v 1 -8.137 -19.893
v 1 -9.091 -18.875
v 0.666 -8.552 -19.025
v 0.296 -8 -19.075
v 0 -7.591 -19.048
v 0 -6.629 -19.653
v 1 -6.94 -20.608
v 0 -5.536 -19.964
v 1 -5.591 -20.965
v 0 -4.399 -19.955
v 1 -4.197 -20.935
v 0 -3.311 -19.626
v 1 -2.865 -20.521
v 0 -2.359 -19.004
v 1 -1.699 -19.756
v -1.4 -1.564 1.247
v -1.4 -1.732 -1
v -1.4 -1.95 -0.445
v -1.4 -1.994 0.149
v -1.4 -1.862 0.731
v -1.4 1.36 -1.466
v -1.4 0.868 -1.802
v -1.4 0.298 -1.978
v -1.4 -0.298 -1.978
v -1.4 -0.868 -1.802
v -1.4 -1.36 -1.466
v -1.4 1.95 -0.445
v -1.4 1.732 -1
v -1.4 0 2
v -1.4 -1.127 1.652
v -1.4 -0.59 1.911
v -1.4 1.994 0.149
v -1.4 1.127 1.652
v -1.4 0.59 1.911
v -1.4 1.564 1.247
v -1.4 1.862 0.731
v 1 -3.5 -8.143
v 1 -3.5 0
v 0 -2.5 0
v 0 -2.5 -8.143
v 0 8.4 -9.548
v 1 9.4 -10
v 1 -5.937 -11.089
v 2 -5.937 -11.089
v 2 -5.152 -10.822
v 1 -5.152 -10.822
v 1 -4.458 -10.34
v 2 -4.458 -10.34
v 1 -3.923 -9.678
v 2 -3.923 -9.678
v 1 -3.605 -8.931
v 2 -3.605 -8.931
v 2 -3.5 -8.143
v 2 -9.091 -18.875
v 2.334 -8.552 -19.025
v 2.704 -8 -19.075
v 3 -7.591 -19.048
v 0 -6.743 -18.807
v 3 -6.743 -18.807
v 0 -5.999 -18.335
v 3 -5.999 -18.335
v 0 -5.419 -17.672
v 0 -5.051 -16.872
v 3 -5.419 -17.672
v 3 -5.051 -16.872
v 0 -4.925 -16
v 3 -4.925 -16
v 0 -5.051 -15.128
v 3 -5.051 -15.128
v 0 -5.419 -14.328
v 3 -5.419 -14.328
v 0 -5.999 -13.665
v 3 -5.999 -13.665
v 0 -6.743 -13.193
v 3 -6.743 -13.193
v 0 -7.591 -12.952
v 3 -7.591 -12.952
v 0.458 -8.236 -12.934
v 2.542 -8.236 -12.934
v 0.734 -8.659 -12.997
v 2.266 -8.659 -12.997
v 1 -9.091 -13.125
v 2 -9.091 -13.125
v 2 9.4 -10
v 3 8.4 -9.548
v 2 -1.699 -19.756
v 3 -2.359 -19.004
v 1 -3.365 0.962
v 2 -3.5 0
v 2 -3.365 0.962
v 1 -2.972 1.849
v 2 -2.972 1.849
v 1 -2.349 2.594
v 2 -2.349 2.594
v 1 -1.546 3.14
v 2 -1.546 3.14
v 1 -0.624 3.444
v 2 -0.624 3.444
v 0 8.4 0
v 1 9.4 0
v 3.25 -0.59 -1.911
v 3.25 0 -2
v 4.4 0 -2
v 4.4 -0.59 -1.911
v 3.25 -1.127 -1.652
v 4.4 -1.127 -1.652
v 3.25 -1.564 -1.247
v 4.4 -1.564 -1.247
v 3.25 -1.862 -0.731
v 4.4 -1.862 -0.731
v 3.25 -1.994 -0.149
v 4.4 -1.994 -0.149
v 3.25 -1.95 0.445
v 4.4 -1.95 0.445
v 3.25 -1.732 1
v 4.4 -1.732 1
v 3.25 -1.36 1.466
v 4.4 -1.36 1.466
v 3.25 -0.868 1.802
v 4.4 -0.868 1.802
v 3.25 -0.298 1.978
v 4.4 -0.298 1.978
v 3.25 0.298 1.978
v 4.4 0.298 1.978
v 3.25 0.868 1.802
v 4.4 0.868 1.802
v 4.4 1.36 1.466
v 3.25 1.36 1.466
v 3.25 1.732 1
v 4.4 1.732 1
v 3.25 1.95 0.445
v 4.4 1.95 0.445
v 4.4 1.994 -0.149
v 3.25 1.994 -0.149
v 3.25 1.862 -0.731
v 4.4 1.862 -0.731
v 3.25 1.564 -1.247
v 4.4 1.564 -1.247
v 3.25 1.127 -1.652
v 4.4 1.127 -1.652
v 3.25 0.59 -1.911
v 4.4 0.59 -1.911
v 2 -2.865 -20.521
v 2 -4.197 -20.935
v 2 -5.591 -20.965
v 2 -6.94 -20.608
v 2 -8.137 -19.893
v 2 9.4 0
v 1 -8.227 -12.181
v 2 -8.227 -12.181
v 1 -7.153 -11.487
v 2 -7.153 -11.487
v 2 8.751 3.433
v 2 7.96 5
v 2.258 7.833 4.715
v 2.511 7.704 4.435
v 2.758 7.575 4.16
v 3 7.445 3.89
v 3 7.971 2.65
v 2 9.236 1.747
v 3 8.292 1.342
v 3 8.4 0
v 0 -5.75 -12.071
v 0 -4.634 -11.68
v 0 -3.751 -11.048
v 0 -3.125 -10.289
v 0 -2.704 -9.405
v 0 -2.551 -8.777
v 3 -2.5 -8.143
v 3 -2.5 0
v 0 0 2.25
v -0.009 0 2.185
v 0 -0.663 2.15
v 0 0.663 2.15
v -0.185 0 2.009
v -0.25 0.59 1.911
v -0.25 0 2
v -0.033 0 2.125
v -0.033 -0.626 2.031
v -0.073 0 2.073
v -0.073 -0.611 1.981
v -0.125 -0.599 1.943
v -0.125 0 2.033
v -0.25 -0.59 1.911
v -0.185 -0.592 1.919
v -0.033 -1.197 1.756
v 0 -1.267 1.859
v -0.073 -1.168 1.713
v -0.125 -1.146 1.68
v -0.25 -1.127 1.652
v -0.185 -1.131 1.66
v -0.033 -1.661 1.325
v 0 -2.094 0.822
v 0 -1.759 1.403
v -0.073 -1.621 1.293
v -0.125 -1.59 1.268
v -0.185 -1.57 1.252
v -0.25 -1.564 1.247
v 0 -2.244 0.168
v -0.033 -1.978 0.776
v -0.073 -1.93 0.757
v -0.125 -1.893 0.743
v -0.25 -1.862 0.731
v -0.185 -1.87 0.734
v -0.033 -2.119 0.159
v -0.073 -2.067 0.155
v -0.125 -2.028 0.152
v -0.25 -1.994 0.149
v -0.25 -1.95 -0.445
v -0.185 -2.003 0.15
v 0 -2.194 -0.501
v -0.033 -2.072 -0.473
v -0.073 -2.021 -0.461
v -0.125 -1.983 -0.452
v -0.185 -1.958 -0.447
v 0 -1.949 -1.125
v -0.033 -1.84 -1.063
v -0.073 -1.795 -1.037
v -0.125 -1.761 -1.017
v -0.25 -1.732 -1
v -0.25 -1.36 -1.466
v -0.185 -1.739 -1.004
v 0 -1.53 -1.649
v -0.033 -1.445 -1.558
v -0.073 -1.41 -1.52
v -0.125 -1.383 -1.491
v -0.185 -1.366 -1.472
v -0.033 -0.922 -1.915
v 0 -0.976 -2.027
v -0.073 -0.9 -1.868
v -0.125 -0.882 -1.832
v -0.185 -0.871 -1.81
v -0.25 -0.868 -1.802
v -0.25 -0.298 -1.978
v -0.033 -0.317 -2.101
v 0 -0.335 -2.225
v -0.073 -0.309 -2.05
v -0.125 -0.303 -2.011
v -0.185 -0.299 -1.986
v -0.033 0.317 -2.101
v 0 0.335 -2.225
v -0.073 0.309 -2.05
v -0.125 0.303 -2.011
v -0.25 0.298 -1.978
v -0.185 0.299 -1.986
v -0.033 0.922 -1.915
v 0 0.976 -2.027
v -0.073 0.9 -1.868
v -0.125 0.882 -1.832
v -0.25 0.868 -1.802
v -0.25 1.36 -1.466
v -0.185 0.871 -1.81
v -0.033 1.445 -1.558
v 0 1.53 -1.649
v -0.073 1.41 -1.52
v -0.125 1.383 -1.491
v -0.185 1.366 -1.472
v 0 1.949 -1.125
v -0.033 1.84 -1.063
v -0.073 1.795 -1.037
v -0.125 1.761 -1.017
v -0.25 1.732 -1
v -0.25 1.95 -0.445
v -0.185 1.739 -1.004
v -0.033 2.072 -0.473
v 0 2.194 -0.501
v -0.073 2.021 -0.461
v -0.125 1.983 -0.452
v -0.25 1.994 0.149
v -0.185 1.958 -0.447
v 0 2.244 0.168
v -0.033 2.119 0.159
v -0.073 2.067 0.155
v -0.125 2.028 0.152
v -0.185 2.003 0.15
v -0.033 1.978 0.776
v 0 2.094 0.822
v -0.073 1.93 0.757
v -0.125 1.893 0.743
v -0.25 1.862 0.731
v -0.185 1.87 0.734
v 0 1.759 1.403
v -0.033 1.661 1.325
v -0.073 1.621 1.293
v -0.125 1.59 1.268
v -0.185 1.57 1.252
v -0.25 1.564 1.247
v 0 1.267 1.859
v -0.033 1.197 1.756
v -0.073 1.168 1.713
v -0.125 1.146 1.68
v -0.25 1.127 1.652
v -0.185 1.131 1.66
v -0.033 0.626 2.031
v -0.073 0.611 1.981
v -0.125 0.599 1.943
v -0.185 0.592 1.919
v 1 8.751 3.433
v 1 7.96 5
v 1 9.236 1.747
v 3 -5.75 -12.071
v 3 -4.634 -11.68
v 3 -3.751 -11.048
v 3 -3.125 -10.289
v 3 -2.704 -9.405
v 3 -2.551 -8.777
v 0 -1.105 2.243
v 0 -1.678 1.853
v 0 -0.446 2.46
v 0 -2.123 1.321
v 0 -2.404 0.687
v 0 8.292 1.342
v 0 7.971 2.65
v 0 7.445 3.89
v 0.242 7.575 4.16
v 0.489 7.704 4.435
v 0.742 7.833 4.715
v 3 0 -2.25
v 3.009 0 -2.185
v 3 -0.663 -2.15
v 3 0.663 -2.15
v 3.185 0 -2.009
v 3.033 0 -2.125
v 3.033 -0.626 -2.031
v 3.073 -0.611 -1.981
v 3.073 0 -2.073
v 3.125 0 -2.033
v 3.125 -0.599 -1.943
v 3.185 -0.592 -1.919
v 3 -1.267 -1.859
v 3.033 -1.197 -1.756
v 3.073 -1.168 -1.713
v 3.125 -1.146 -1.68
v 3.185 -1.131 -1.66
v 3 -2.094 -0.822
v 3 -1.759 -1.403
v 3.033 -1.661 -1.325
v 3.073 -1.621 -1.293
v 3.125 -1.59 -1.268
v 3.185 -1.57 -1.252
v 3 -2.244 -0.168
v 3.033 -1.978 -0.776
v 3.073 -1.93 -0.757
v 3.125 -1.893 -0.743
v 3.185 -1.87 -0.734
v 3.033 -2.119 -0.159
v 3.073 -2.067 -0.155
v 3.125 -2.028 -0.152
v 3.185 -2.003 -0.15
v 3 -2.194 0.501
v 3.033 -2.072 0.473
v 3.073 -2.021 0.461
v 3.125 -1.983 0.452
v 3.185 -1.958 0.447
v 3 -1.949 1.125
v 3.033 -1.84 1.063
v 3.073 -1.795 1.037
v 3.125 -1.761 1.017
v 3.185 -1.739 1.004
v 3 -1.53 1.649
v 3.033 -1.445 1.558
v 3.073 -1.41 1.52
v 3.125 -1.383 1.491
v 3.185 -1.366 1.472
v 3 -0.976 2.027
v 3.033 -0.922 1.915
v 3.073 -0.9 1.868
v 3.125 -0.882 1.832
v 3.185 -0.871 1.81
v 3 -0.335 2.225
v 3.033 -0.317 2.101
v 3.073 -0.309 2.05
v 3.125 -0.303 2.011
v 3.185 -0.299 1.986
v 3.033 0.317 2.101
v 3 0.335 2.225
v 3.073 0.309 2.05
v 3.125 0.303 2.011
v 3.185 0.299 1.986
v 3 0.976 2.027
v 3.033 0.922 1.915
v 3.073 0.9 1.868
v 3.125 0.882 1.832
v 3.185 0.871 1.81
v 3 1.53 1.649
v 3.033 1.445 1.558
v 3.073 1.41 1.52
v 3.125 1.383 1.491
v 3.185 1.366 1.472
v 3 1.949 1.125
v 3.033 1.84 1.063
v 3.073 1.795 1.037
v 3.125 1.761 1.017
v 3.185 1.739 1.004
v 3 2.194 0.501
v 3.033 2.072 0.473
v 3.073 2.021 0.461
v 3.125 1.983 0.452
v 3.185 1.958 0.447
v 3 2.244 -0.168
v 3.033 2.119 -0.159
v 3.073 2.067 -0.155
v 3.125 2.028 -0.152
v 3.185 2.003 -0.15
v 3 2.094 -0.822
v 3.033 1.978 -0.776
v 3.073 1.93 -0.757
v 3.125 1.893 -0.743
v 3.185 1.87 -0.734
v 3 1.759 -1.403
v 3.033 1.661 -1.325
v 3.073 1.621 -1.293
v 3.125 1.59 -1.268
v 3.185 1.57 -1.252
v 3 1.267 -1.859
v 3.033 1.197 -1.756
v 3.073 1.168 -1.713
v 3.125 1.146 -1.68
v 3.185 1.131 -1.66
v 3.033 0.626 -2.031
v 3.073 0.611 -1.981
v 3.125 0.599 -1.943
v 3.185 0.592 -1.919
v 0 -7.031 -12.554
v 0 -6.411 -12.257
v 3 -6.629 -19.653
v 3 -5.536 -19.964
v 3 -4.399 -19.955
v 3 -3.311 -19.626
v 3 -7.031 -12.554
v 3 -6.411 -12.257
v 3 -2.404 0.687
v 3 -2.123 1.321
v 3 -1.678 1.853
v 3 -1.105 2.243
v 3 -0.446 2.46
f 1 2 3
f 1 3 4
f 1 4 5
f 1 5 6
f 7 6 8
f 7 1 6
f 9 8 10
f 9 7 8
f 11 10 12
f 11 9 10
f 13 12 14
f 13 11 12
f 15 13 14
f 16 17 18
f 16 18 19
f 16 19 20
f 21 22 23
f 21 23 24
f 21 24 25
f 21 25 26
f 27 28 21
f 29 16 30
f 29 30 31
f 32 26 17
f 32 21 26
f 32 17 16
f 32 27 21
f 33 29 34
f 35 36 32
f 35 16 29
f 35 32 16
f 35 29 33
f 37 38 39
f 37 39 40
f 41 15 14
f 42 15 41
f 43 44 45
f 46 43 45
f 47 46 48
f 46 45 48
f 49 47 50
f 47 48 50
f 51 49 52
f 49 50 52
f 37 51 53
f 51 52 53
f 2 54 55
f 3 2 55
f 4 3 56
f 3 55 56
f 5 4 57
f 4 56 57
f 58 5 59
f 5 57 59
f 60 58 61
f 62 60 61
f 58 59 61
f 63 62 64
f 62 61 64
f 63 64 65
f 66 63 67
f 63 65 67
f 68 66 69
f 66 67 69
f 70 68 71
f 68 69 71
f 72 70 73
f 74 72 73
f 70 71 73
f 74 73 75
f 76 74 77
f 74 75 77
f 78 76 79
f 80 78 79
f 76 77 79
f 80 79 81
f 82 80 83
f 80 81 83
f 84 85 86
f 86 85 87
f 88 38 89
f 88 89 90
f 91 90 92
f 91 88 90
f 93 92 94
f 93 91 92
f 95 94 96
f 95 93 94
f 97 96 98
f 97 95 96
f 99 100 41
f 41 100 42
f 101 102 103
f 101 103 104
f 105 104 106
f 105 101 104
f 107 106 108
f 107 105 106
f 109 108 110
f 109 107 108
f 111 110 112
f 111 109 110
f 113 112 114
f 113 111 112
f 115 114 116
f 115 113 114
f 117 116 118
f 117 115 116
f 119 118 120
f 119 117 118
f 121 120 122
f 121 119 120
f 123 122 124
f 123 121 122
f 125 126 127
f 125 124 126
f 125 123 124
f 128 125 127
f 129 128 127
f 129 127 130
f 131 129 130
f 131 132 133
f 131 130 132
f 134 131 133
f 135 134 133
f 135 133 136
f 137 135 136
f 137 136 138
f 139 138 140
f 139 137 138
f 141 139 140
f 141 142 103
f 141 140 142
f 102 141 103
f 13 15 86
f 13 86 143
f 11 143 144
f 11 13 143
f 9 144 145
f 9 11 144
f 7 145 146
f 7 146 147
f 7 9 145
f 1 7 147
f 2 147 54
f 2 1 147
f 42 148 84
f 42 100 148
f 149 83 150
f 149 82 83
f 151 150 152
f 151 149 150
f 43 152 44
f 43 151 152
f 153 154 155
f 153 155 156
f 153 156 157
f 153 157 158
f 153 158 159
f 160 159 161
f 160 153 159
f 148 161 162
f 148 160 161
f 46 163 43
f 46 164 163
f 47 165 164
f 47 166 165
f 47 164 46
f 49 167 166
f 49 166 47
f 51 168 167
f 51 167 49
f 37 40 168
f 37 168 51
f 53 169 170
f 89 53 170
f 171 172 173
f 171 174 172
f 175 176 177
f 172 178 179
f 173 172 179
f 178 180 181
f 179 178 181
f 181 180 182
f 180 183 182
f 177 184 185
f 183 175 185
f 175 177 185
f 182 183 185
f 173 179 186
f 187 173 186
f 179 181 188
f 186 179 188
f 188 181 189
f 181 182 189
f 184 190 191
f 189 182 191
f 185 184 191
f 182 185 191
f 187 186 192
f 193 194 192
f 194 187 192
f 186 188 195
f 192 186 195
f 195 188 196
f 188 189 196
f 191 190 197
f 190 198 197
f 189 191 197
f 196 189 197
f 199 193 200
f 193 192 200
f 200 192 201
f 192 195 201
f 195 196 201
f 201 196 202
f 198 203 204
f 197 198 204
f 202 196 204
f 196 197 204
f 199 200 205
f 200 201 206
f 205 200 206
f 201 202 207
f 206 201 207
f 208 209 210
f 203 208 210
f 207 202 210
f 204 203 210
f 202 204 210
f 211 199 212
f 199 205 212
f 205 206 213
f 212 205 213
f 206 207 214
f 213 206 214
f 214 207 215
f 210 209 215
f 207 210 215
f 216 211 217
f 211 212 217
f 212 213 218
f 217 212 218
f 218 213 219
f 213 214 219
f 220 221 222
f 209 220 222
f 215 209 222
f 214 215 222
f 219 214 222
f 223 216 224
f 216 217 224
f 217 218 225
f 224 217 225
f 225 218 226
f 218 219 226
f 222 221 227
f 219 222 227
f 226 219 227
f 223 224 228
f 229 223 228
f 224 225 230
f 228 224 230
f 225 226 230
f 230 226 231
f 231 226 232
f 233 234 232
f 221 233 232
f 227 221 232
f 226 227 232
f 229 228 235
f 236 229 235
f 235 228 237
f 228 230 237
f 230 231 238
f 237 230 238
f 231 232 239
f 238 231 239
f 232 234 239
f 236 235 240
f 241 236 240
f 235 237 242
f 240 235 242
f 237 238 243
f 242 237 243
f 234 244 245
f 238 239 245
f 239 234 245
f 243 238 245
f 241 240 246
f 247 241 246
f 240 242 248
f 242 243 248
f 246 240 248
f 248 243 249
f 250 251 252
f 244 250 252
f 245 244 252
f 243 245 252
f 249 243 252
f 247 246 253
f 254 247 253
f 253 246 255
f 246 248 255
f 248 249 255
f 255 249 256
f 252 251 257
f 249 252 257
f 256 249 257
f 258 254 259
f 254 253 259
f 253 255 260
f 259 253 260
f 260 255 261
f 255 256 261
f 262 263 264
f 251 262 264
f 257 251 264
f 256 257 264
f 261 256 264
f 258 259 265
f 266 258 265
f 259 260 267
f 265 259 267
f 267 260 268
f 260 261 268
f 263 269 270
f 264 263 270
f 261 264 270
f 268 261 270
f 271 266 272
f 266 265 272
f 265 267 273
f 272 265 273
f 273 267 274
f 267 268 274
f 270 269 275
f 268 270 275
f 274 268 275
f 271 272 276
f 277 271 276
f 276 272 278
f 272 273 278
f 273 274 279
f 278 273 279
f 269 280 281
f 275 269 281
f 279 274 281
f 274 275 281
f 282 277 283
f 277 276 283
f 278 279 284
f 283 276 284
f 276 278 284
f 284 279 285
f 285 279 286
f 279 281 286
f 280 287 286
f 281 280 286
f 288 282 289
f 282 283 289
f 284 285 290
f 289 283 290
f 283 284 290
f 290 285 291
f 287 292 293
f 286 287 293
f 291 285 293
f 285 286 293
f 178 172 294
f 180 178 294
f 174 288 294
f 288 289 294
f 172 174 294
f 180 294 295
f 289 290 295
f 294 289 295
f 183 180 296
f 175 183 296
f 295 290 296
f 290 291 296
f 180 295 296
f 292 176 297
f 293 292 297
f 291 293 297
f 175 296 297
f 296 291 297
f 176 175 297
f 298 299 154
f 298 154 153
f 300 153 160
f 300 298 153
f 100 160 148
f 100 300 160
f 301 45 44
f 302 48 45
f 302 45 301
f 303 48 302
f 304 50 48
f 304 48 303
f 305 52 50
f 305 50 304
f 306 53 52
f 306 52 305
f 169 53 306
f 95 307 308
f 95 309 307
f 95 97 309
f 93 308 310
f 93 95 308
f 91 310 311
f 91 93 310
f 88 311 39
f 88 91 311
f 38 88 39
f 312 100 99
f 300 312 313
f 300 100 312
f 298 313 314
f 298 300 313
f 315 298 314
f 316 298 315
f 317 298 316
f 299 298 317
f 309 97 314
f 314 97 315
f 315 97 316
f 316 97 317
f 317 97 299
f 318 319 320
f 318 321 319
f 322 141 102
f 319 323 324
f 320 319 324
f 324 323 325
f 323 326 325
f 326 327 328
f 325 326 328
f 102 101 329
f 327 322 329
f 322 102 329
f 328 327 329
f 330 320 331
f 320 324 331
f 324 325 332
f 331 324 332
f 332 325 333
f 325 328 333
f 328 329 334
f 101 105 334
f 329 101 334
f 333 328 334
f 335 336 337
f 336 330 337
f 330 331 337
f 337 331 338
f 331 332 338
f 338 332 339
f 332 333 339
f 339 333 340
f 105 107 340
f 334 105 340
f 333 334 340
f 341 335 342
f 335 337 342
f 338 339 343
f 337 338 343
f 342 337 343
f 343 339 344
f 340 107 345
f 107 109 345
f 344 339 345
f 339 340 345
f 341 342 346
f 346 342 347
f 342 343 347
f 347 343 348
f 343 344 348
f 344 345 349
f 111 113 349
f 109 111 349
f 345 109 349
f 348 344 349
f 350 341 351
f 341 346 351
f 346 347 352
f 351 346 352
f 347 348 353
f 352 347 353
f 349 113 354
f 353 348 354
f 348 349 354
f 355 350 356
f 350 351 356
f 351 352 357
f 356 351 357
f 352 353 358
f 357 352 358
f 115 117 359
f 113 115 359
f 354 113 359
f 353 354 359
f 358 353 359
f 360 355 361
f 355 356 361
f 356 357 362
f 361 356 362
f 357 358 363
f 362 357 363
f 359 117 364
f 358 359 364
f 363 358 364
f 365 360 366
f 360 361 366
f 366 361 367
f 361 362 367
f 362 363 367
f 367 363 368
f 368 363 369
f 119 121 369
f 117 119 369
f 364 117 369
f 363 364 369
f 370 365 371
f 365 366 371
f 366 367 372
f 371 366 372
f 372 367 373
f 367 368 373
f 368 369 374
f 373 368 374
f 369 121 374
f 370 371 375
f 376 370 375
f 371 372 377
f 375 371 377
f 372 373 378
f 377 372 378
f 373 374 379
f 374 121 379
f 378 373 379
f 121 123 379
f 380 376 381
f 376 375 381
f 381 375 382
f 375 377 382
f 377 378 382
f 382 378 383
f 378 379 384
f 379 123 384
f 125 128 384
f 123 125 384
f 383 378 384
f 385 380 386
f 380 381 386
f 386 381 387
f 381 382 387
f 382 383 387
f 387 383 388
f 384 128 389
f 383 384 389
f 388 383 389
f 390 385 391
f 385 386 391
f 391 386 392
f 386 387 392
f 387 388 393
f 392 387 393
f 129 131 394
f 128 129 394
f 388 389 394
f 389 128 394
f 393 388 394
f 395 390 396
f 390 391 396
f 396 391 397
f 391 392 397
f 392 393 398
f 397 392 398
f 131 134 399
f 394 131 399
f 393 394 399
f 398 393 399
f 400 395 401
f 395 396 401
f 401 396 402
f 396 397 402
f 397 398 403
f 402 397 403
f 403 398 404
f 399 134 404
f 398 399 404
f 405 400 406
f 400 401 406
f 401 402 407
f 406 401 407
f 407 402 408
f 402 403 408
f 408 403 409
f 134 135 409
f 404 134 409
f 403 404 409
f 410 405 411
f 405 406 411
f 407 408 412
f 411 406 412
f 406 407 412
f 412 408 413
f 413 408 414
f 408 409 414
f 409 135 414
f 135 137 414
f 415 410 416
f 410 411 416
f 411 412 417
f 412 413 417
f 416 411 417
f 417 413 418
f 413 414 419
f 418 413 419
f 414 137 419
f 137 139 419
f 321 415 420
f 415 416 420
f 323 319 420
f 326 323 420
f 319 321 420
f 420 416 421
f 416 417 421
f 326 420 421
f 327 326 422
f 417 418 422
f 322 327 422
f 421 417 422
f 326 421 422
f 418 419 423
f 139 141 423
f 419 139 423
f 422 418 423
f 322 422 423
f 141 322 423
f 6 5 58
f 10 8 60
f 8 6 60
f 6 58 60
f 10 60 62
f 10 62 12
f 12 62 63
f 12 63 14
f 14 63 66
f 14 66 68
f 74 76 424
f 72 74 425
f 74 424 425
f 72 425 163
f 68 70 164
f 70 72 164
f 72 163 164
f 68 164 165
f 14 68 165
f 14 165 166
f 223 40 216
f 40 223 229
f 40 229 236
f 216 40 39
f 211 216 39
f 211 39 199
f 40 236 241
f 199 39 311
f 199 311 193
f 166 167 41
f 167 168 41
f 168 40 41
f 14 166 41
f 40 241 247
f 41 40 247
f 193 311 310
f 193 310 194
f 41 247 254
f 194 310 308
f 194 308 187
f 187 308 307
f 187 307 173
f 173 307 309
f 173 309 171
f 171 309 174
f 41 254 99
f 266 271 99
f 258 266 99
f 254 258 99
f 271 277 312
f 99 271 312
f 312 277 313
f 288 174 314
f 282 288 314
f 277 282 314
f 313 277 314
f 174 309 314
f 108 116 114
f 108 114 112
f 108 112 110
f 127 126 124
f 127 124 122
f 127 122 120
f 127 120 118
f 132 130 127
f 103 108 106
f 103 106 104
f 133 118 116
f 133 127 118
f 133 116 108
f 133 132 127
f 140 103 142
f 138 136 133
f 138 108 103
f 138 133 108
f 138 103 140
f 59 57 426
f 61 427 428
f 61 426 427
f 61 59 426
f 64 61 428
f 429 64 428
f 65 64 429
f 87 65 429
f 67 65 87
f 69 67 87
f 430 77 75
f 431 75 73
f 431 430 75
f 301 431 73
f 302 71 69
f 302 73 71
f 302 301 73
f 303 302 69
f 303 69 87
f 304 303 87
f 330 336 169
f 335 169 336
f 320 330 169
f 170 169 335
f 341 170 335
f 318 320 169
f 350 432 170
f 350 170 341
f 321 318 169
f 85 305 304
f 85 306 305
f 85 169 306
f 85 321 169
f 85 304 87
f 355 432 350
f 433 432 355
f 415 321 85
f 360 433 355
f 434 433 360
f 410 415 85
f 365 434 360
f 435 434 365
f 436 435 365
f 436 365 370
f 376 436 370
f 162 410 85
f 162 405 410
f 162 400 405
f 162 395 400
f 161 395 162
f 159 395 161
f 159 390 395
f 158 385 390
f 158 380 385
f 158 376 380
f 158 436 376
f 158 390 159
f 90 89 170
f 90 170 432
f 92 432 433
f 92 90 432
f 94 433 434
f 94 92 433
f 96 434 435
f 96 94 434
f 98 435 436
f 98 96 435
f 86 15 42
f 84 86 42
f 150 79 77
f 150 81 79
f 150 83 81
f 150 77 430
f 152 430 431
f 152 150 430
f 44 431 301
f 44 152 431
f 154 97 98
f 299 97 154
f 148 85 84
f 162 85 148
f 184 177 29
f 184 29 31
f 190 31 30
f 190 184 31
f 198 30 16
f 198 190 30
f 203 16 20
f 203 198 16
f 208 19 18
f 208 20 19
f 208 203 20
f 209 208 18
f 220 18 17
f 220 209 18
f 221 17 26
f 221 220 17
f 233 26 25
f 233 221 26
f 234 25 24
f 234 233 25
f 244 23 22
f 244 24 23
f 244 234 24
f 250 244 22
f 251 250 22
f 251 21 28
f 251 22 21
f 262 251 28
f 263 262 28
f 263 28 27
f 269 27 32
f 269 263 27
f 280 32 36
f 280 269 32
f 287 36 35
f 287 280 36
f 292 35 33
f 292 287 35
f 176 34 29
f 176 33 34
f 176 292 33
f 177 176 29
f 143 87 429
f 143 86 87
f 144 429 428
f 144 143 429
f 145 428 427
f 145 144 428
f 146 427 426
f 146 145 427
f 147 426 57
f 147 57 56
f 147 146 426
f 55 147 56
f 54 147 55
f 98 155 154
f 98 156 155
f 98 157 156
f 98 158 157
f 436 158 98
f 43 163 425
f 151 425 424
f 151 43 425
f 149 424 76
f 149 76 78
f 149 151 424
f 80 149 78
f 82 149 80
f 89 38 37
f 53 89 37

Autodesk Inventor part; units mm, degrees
ref_plane "YZ Plane" through (0, 0, 0) normal (1, 0, 0) x (0, 1, 0)
ref_plane "XZ Plane" through (0, 0, 0) normal (0, 1, 0) x (-1, 0, 0)
ref_plane "XY Plane" through (0, 0, 0) normal (0, 0, 1) x (1, 0, 0)
sketch "Sketch1" plane through (0, 0, 0) normal (1, 0, 0) x (0, 1, 0)
  arc A0 (9.4, 0) -> (7.9599, 5) centre (0, 0) ccw
  circle A1 centre (0, 0) radius 3.5
  line L0 (-0.6243, 3.4439) -> (7.9599, 5)
  line L1 (-3.5, 0) -> (-3.5, -8.9713)
  line L2 (9.4, 0) -> (9.4, -10)
  line L3 (-3.5, -8.9713) -> (-4.2585, -11.0553)
  line L4 (-3.5, -8.9713) -> (26.5, -8.9713) construction
  line L5 (-1.6991, -19.7555) -> (9.4, -10)
  arc A2 (-4.2585, -11.0553) -> (-1.6991, -19.7555) centre (-5, -16) ccw
  dimension "d0" = 18.8
  dimension "d2" = 7
  dimension "d4" = 5
  dimension "d5" = 10
  dimension "d7" = 110
  dimension "d26" = 10
  dimension "d27" = 5
  dimension "d28" = 16
extrude "Extrusion1" add sketch "Sketch1" along normal blind 3
sketch "Sketch2" plane through (3, 0, 0) normal (1, 0, 0) x (0, 0, -1)
  circle A0 centre (0, 0) radius 2
  dimension "d12" = 4
extrude "Extrusion2" add sketch "Sketch2" along normal blind 1.4
sketch "Sketch3" plane through (0, 0, 0) normal (-1, 0, 0) x (0, 0, 1)
  circle A0 centre (0, 0) radius 2
  dimension "d15" = 4
extrude "Extrusion3" add sketch "Sketch3" along normal blind 1.4
fillet "Fillet2" radius 3 2 edges at (1.5, -4.2585, -11.0553) (1.5, -3.5, -8.9713)
fillet "Fillet1" radius 0.25 2 edges at (3, 0, 2) (0, 0, -2)
chamfer "Chamfer2" distance 1 angle 45 14 edges at (0, 9.4, -5) (0, 9.0328, 2.6016) (3, 9.4, -5) (3, 9.0328, 2.6016) (0, 3.6678, 4.2219) (0, -2.6865, 2.2433) (0, -3.5, -4.0714) (0, -9.4918, -18.1964) (0, 3.8505, -14.8778) (3, 3.6678, 4.2219) (3, -2.6865, 2.2433) (3, -3.5, -4.0714) (3, -9.4918, -18.1964) (3, 3.8505, -14.8778)
sketch "Sketch5" plane through (3, 0, 0) normal (1, 0, 0) x (0, 0, -1)
  circle A0 centre (16, -8) radius 3.075
  point P0 (0, 0)
  dimension "d37" = 6.15
  dimension "d40" = 16
  dimension "d41" = 8
extrude "Extrusion5" cut sketch "Sketch5" against normal up to surface (3 mm away)
properties part number "TrainPullert"
